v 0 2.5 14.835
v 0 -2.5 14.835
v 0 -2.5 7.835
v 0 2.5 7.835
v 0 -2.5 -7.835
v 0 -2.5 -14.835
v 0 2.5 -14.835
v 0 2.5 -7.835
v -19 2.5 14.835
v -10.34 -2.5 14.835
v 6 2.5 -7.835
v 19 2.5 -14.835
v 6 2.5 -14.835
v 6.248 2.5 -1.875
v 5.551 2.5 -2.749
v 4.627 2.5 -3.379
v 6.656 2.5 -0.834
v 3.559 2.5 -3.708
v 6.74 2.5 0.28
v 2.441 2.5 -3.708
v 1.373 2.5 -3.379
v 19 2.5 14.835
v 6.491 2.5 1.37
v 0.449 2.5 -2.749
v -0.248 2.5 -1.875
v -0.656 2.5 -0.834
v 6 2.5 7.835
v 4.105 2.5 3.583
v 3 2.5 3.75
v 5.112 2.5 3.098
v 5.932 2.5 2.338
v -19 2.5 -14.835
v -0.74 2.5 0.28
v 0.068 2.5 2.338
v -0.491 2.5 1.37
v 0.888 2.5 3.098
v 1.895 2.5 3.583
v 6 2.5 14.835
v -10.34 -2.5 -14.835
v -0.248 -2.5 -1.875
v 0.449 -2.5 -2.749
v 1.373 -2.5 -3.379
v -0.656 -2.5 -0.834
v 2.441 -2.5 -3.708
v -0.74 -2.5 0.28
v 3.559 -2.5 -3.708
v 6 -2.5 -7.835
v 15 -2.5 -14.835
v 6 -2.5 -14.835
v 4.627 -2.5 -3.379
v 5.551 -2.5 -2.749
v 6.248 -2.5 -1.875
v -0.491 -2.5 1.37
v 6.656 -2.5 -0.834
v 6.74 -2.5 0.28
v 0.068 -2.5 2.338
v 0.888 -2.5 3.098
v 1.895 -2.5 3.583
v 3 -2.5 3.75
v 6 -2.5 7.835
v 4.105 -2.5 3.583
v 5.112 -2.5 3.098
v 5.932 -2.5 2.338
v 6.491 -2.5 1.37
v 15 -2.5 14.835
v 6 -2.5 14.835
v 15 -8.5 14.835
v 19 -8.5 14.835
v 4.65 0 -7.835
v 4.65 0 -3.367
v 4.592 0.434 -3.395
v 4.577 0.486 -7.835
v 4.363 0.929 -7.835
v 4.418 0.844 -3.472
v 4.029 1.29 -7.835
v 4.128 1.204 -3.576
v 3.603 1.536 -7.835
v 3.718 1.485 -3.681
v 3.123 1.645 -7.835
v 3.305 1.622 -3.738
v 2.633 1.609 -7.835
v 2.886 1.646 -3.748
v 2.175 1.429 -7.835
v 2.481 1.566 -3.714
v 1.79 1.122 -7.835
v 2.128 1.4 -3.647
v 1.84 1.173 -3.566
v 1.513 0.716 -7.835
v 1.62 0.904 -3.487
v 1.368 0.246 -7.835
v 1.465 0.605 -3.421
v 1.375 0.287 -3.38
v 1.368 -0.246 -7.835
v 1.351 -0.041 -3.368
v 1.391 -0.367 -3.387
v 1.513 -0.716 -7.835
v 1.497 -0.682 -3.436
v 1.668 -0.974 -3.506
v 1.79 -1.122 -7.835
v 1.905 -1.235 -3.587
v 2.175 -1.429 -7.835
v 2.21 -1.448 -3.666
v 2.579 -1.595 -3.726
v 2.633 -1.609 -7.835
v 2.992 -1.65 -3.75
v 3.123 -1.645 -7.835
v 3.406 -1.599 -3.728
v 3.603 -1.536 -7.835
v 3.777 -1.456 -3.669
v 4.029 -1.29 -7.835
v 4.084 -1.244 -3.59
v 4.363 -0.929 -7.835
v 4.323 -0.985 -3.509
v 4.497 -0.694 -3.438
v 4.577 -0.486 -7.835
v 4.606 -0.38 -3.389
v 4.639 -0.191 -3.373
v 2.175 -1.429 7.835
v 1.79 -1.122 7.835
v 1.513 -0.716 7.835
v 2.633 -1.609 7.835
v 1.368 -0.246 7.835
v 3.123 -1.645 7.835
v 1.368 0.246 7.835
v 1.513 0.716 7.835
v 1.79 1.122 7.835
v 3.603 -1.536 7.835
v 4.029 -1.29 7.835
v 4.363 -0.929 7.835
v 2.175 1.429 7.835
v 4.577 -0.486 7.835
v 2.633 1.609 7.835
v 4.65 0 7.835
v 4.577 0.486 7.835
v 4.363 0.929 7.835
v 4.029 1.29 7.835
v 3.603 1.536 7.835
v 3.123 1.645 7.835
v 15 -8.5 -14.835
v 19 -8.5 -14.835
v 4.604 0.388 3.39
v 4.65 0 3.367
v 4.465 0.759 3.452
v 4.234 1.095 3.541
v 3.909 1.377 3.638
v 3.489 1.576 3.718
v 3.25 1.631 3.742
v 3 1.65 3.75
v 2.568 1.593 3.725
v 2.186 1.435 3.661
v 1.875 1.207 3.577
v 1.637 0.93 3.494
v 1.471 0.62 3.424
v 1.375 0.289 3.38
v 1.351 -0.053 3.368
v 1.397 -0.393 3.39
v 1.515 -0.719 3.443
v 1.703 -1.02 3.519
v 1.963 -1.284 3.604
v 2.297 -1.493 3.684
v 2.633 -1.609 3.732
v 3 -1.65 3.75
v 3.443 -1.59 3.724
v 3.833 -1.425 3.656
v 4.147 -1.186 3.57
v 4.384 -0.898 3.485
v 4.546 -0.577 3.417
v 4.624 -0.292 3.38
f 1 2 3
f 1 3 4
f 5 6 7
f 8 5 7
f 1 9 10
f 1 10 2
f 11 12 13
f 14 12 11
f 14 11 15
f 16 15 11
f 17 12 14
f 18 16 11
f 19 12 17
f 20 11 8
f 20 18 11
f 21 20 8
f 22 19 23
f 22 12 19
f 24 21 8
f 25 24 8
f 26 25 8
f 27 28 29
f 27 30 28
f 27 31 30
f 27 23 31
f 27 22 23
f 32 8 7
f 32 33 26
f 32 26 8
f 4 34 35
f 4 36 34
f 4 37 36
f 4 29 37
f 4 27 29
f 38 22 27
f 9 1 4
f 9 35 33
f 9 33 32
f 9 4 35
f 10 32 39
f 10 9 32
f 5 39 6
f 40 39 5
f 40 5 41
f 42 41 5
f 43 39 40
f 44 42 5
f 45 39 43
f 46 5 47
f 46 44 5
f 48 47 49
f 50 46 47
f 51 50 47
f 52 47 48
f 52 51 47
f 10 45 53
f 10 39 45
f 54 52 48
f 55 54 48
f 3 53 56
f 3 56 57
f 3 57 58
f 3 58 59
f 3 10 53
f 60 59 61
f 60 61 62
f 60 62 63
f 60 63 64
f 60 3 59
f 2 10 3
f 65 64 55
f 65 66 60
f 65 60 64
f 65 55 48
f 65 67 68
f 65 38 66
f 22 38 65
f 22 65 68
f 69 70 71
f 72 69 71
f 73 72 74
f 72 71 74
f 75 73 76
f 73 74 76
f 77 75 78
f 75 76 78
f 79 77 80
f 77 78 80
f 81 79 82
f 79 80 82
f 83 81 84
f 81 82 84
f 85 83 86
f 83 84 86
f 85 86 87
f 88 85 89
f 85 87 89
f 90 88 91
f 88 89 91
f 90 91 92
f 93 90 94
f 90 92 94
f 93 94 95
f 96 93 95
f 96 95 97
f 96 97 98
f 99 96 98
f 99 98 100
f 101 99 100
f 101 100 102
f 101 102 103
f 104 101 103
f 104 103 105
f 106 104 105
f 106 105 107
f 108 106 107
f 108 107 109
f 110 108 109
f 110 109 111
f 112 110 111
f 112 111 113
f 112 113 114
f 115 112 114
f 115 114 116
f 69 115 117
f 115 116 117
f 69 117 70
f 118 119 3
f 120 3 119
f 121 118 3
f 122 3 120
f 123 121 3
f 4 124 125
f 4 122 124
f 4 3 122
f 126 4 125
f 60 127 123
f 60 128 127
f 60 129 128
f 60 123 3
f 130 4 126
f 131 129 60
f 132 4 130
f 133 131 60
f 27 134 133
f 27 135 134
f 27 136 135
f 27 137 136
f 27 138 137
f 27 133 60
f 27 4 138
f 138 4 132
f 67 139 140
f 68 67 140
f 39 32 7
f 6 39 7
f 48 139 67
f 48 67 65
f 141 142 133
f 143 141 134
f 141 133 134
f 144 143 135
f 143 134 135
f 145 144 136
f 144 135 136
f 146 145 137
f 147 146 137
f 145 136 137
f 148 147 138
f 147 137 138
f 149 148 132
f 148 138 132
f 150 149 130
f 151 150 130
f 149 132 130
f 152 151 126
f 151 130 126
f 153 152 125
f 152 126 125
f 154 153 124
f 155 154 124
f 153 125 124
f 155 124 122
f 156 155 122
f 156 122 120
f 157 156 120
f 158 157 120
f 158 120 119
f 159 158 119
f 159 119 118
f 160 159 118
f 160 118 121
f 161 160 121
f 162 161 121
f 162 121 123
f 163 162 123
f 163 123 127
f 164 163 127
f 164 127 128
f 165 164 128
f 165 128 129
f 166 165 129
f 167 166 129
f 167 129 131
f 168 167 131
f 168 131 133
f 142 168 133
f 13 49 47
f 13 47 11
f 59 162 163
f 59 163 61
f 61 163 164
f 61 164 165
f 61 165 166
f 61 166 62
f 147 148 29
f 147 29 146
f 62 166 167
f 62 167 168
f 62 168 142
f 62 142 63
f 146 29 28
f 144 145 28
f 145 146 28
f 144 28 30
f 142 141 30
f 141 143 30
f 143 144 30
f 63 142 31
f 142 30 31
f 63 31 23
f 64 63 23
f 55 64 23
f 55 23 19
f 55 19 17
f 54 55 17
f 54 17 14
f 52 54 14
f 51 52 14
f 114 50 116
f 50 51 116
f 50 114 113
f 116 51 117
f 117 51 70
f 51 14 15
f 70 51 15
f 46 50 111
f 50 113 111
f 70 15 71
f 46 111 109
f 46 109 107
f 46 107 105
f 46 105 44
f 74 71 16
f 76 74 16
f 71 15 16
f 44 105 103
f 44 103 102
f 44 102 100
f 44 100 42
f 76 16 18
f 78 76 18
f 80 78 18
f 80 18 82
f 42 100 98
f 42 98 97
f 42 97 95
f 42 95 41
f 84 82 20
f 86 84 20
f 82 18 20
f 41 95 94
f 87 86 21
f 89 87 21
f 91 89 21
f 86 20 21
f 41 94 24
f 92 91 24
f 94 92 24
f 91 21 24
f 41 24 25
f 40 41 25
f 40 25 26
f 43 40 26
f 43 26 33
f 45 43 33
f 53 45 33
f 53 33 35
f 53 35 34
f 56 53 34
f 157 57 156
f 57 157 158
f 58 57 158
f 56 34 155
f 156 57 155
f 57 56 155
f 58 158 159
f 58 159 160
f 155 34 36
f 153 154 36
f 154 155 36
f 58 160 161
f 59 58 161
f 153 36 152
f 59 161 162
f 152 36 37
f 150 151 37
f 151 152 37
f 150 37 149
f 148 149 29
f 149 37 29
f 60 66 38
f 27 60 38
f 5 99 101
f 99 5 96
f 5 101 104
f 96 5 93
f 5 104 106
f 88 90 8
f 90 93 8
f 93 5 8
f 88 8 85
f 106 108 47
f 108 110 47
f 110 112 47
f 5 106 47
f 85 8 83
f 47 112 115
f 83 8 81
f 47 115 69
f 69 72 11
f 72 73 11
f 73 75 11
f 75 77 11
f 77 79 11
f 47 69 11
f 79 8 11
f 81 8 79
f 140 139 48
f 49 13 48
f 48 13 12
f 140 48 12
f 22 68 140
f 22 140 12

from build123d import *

# Parameters (mm, degrees)
BOSS_EXTRUDE1_DEPTH = 14.835
CUT_EXTRUDE1_REACH  = 37.321
SKETCH4_R           = 1.65
SKETCH4_3_W         = 6
SKETCH4_3_H         = 5
SKETCH4_3_R         = 1.65
CUT_EXTRUDE3_DEPTH  = 7
CUT_EXTRUDE2_REACH  = 26.619
SKETCH5_R           = 3.75
SKETCH6_W           = 4
SKETCH6_H           = 6
BOSS_EXTRUDE2_DEPTH = 29.67


with BuildPart() as part:
    # Sketch3 → Boss-Extrude1 (new, symmetric)
    with BuildSketch(Plane.XY):
        Polygon((-19, 2.5), (-10.339745962, -2.5), (19, -2.5), (19, 2.5), align=None)
    extrude(amount=BOSS_EXTRUDE1_DEPTH, both=True)

    # Sketch4 → Cut-Extrude1 (cut, up to next)
    with BuildSketch(Plane.XY.offset(14.835), mode=Mode.PRIVATE) as cut_extrude1_sk1:
        with Locations((3, 0)):
            Circle(SKETCH4_R)
    cut_extrude1_tool1 = extrude(cut_extrude1_sk1.sketch, amount=-CUT_EXTRUDE1_REACH, mode=Mode.PRIVATE) & part.part
    add(cut_extrude1_tool1.solids().sort_by_distance((3, 0, 14.835))[0], mode=Mode.SUBTRACT)

    # Sketch4<3> → Cut-Extrude3 (cut)
    with BuildSketch(Plane.XY.offset(14.835)):
        with Locations((3, 0)):
            Rectangle(SKETCH4_3_W, SKETCH4_3_H)
        with Locations((3, 0)):
            Circle(SKETCH4_3_R, mode=Mode.SUBTRACT)
    cut_extrude3 = extrude(amount=-CUT_EXTRUDE3_DEPTH, mode=Mode.SUBTRACT)

    # Mirror1: Cut-Extrude3 across plane
    add(cut_extrude3.mirror(Plane.XY), mode=Mode.SUBTRACT)

    # Sketch5 → Cut-Extrude2 (cut, up to next)
    with BuildSketch(Plane(origin=(0, 2.5, 0), x_dir=(1, 0, 0), z_dir=(0, 1, 0)), mode=Mode.PRIVATE) as cut_extrude2_sk1:
        with Locations(Location((3, 0, 0), (0, 0, 270))):
            Circle(SKETCH5_R)
    cut_extrude2_tool1 = extrude(cut_extrude2_sk1.sketch, amount=-CUT_EXTRUDE2_REACH, mode=Mode.PRIVATE) & part.part
    add(cut_extrude2_tool1.solids().sort_by_distance((3, 2.5, 0))[0], mode=Mode.SUBTRACT)

    # Sketch6 → Boss-Extrude2 (add)
    with BuildSketch(Plane.XY.offset(14.835)):
        with Locations((17, -5.5)):
            Rectangle(SKETCH6_W, SKETCH6_H)
    extrude(amount=-BOSS_EXTRUDE2_DEPTH)


solid = part.part
